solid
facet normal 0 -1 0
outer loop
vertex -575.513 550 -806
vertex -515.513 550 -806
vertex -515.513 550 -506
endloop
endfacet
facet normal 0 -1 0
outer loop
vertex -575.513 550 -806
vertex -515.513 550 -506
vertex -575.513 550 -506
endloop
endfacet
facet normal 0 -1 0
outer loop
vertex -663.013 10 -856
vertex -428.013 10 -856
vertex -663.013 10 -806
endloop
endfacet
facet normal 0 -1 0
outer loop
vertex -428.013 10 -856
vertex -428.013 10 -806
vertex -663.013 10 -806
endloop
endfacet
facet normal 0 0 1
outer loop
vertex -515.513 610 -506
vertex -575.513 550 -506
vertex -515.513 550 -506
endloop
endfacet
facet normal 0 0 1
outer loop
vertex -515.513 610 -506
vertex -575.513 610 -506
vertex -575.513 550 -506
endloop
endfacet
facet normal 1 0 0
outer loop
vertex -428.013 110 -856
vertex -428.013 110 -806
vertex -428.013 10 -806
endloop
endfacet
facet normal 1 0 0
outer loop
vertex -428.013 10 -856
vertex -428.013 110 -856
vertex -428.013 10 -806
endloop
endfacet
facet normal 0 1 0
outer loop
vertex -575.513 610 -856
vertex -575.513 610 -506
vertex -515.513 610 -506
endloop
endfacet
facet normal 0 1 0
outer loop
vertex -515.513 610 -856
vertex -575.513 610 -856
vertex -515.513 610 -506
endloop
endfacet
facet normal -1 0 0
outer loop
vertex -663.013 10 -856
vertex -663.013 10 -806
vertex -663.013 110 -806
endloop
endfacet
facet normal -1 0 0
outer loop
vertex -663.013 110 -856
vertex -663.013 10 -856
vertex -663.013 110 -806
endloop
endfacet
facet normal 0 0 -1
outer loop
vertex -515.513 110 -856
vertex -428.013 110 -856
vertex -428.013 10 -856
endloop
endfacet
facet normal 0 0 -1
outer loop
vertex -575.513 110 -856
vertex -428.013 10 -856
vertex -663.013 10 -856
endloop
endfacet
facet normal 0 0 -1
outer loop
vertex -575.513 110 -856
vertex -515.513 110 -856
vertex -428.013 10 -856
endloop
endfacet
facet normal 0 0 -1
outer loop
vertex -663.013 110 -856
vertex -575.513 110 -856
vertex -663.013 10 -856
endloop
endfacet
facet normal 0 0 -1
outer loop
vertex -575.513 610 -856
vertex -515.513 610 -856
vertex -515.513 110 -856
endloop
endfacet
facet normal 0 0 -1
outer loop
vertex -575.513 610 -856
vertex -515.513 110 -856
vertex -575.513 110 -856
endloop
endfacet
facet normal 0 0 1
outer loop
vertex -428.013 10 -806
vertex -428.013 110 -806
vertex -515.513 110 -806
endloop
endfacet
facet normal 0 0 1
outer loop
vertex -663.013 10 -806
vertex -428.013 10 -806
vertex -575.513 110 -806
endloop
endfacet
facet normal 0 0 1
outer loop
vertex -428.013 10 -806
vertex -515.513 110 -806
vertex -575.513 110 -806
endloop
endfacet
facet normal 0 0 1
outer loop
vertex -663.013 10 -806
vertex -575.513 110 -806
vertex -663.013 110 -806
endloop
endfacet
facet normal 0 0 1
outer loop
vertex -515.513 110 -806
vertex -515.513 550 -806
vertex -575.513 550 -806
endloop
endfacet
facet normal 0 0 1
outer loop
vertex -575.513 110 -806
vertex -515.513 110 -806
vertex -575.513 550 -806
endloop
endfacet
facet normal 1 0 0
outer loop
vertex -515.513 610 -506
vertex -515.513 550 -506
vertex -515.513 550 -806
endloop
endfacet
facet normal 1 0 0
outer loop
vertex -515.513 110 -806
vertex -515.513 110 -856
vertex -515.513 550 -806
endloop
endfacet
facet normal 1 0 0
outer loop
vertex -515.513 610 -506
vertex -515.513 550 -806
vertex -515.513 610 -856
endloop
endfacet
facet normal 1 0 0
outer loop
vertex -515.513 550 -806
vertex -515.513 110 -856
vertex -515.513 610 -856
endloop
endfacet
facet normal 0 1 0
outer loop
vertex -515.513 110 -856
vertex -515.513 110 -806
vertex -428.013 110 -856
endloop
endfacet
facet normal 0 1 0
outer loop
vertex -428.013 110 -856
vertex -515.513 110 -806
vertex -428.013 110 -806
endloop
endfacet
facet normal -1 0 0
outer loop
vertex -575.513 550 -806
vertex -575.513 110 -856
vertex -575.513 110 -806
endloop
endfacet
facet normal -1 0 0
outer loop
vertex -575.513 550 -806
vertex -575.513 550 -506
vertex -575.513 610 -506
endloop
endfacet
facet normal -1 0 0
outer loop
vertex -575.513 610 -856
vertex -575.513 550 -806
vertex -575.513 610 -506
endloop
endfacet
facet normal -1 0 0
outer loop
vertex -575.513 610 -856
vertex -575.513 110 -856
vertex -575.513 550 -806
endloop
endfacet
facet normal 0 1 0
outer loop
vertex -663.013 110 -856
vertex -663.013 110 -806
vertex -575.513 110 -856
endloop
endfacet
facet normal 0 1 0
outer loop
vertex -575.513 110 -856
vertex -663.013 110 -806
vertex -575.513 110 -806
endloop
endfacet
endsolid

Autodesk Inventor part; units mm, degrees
ref_plane "YZ Plane" through (0, 0, 0) normal (1, 0, 0) x (0, 1, 0)
ref_plane "XZ Plane" through (0, 0, 0) normal (0, 1, 0) x (-1, 0, 0)
ref_plane "XY Plane" through (0, 0, 0) normal (0, 0, 1) x (1, 0, 0)
ref_plane "Work Plane1" through (0, 0, -806) normal (0, 0, -1) x (-1, 0, 0)
sketch "Sketch1" plane through (0, 0, -806) normal (0, 0, -1) x (-1, 0, 0)
  line L0 (428.0132, 10) -> (663.0132, 10) projected
  line L1 (663.0132, 10) -> (663.0132, 110) projected
  line L2 (663.0132, 110) -> (428.0132, 110) projected
  line L3 (428.0132, 110) -> (428.0132, 10) projected
  point P0 (0, 0)
extrude "Extrusion1" add sketch "Sketch1" along normal blind 50
sketch "Sketch2" plane through (-663.0132, 110, -806) normal (0, 1, 0) x (1, 0, 0)
  line L0 (117.5, 50) -> (147.5, 50)
  line L1 (0, 0) -> (235, 0) projected
  line L2 (147.5, 50) -> (87.5, 50)
  line L3 (87.5, 50) -> (87.5, 0)
  line L4 (87.5, 0) -> (147.5, 0)
  line L5 (147.5, 0) -> (147.5, 50)
  point P0 (663.0132, -806)
  dimension "d4" = 60
extrude "Extrusion2" add sketch "Sketch2" along normal blind 500
sketch "Sketch3" plane through (0, 0, -806) normal (0, 0, 1) x (1, 0, 0)
  line L0 (-663.0132, 10) -> (-663.0132, 110) projected
  line L1 (-428.0132, 10) -> (-663.0132, 10) projected
  line L2 (-428.0132, 110) -> (-428.0132, 10) projected
  line L3 (-515.5132, 110) -> (-428.0132, 110) projected
  line L4 (-515.5132, 110) -> (-515.5132, 610) projected
  line L5 (-575.5132, 610) -> (-515.5132, 610) projected
  line L6 (-575.5132, 110) -> (-575.5132, 610) projected
  line L7 (-663.0132, 110) -> (-575.5132, 110) projected
  line L8 (-575.5132, 110) -> (-575.5132, 610) projected
  line L9 (-515.5132, 110) -> (-515.5132, 610) projected
  line L10 (-575.5132, 610) -> (-515.5132, 610)
  line L11 (-515.5132, 610) -> (-515.5132, 550)
  line L12 (-515.5132, 550) -> (-575.5132, 550)
  line L13 (-575.5132, 550) -> (-575.5132, 610)
  point P0 (0, 0)
  dimension "d7" = 60
extrude "Extrusion3" add sketch "Sketch3" along normal blind 300 contours L6 L5 L4 L12
sketch "Sketch4" plane through (-663.0132, 610, -806) normal (0, 1, 0) x (1, 0, 0)
  point P0 (663.0132, -806)
